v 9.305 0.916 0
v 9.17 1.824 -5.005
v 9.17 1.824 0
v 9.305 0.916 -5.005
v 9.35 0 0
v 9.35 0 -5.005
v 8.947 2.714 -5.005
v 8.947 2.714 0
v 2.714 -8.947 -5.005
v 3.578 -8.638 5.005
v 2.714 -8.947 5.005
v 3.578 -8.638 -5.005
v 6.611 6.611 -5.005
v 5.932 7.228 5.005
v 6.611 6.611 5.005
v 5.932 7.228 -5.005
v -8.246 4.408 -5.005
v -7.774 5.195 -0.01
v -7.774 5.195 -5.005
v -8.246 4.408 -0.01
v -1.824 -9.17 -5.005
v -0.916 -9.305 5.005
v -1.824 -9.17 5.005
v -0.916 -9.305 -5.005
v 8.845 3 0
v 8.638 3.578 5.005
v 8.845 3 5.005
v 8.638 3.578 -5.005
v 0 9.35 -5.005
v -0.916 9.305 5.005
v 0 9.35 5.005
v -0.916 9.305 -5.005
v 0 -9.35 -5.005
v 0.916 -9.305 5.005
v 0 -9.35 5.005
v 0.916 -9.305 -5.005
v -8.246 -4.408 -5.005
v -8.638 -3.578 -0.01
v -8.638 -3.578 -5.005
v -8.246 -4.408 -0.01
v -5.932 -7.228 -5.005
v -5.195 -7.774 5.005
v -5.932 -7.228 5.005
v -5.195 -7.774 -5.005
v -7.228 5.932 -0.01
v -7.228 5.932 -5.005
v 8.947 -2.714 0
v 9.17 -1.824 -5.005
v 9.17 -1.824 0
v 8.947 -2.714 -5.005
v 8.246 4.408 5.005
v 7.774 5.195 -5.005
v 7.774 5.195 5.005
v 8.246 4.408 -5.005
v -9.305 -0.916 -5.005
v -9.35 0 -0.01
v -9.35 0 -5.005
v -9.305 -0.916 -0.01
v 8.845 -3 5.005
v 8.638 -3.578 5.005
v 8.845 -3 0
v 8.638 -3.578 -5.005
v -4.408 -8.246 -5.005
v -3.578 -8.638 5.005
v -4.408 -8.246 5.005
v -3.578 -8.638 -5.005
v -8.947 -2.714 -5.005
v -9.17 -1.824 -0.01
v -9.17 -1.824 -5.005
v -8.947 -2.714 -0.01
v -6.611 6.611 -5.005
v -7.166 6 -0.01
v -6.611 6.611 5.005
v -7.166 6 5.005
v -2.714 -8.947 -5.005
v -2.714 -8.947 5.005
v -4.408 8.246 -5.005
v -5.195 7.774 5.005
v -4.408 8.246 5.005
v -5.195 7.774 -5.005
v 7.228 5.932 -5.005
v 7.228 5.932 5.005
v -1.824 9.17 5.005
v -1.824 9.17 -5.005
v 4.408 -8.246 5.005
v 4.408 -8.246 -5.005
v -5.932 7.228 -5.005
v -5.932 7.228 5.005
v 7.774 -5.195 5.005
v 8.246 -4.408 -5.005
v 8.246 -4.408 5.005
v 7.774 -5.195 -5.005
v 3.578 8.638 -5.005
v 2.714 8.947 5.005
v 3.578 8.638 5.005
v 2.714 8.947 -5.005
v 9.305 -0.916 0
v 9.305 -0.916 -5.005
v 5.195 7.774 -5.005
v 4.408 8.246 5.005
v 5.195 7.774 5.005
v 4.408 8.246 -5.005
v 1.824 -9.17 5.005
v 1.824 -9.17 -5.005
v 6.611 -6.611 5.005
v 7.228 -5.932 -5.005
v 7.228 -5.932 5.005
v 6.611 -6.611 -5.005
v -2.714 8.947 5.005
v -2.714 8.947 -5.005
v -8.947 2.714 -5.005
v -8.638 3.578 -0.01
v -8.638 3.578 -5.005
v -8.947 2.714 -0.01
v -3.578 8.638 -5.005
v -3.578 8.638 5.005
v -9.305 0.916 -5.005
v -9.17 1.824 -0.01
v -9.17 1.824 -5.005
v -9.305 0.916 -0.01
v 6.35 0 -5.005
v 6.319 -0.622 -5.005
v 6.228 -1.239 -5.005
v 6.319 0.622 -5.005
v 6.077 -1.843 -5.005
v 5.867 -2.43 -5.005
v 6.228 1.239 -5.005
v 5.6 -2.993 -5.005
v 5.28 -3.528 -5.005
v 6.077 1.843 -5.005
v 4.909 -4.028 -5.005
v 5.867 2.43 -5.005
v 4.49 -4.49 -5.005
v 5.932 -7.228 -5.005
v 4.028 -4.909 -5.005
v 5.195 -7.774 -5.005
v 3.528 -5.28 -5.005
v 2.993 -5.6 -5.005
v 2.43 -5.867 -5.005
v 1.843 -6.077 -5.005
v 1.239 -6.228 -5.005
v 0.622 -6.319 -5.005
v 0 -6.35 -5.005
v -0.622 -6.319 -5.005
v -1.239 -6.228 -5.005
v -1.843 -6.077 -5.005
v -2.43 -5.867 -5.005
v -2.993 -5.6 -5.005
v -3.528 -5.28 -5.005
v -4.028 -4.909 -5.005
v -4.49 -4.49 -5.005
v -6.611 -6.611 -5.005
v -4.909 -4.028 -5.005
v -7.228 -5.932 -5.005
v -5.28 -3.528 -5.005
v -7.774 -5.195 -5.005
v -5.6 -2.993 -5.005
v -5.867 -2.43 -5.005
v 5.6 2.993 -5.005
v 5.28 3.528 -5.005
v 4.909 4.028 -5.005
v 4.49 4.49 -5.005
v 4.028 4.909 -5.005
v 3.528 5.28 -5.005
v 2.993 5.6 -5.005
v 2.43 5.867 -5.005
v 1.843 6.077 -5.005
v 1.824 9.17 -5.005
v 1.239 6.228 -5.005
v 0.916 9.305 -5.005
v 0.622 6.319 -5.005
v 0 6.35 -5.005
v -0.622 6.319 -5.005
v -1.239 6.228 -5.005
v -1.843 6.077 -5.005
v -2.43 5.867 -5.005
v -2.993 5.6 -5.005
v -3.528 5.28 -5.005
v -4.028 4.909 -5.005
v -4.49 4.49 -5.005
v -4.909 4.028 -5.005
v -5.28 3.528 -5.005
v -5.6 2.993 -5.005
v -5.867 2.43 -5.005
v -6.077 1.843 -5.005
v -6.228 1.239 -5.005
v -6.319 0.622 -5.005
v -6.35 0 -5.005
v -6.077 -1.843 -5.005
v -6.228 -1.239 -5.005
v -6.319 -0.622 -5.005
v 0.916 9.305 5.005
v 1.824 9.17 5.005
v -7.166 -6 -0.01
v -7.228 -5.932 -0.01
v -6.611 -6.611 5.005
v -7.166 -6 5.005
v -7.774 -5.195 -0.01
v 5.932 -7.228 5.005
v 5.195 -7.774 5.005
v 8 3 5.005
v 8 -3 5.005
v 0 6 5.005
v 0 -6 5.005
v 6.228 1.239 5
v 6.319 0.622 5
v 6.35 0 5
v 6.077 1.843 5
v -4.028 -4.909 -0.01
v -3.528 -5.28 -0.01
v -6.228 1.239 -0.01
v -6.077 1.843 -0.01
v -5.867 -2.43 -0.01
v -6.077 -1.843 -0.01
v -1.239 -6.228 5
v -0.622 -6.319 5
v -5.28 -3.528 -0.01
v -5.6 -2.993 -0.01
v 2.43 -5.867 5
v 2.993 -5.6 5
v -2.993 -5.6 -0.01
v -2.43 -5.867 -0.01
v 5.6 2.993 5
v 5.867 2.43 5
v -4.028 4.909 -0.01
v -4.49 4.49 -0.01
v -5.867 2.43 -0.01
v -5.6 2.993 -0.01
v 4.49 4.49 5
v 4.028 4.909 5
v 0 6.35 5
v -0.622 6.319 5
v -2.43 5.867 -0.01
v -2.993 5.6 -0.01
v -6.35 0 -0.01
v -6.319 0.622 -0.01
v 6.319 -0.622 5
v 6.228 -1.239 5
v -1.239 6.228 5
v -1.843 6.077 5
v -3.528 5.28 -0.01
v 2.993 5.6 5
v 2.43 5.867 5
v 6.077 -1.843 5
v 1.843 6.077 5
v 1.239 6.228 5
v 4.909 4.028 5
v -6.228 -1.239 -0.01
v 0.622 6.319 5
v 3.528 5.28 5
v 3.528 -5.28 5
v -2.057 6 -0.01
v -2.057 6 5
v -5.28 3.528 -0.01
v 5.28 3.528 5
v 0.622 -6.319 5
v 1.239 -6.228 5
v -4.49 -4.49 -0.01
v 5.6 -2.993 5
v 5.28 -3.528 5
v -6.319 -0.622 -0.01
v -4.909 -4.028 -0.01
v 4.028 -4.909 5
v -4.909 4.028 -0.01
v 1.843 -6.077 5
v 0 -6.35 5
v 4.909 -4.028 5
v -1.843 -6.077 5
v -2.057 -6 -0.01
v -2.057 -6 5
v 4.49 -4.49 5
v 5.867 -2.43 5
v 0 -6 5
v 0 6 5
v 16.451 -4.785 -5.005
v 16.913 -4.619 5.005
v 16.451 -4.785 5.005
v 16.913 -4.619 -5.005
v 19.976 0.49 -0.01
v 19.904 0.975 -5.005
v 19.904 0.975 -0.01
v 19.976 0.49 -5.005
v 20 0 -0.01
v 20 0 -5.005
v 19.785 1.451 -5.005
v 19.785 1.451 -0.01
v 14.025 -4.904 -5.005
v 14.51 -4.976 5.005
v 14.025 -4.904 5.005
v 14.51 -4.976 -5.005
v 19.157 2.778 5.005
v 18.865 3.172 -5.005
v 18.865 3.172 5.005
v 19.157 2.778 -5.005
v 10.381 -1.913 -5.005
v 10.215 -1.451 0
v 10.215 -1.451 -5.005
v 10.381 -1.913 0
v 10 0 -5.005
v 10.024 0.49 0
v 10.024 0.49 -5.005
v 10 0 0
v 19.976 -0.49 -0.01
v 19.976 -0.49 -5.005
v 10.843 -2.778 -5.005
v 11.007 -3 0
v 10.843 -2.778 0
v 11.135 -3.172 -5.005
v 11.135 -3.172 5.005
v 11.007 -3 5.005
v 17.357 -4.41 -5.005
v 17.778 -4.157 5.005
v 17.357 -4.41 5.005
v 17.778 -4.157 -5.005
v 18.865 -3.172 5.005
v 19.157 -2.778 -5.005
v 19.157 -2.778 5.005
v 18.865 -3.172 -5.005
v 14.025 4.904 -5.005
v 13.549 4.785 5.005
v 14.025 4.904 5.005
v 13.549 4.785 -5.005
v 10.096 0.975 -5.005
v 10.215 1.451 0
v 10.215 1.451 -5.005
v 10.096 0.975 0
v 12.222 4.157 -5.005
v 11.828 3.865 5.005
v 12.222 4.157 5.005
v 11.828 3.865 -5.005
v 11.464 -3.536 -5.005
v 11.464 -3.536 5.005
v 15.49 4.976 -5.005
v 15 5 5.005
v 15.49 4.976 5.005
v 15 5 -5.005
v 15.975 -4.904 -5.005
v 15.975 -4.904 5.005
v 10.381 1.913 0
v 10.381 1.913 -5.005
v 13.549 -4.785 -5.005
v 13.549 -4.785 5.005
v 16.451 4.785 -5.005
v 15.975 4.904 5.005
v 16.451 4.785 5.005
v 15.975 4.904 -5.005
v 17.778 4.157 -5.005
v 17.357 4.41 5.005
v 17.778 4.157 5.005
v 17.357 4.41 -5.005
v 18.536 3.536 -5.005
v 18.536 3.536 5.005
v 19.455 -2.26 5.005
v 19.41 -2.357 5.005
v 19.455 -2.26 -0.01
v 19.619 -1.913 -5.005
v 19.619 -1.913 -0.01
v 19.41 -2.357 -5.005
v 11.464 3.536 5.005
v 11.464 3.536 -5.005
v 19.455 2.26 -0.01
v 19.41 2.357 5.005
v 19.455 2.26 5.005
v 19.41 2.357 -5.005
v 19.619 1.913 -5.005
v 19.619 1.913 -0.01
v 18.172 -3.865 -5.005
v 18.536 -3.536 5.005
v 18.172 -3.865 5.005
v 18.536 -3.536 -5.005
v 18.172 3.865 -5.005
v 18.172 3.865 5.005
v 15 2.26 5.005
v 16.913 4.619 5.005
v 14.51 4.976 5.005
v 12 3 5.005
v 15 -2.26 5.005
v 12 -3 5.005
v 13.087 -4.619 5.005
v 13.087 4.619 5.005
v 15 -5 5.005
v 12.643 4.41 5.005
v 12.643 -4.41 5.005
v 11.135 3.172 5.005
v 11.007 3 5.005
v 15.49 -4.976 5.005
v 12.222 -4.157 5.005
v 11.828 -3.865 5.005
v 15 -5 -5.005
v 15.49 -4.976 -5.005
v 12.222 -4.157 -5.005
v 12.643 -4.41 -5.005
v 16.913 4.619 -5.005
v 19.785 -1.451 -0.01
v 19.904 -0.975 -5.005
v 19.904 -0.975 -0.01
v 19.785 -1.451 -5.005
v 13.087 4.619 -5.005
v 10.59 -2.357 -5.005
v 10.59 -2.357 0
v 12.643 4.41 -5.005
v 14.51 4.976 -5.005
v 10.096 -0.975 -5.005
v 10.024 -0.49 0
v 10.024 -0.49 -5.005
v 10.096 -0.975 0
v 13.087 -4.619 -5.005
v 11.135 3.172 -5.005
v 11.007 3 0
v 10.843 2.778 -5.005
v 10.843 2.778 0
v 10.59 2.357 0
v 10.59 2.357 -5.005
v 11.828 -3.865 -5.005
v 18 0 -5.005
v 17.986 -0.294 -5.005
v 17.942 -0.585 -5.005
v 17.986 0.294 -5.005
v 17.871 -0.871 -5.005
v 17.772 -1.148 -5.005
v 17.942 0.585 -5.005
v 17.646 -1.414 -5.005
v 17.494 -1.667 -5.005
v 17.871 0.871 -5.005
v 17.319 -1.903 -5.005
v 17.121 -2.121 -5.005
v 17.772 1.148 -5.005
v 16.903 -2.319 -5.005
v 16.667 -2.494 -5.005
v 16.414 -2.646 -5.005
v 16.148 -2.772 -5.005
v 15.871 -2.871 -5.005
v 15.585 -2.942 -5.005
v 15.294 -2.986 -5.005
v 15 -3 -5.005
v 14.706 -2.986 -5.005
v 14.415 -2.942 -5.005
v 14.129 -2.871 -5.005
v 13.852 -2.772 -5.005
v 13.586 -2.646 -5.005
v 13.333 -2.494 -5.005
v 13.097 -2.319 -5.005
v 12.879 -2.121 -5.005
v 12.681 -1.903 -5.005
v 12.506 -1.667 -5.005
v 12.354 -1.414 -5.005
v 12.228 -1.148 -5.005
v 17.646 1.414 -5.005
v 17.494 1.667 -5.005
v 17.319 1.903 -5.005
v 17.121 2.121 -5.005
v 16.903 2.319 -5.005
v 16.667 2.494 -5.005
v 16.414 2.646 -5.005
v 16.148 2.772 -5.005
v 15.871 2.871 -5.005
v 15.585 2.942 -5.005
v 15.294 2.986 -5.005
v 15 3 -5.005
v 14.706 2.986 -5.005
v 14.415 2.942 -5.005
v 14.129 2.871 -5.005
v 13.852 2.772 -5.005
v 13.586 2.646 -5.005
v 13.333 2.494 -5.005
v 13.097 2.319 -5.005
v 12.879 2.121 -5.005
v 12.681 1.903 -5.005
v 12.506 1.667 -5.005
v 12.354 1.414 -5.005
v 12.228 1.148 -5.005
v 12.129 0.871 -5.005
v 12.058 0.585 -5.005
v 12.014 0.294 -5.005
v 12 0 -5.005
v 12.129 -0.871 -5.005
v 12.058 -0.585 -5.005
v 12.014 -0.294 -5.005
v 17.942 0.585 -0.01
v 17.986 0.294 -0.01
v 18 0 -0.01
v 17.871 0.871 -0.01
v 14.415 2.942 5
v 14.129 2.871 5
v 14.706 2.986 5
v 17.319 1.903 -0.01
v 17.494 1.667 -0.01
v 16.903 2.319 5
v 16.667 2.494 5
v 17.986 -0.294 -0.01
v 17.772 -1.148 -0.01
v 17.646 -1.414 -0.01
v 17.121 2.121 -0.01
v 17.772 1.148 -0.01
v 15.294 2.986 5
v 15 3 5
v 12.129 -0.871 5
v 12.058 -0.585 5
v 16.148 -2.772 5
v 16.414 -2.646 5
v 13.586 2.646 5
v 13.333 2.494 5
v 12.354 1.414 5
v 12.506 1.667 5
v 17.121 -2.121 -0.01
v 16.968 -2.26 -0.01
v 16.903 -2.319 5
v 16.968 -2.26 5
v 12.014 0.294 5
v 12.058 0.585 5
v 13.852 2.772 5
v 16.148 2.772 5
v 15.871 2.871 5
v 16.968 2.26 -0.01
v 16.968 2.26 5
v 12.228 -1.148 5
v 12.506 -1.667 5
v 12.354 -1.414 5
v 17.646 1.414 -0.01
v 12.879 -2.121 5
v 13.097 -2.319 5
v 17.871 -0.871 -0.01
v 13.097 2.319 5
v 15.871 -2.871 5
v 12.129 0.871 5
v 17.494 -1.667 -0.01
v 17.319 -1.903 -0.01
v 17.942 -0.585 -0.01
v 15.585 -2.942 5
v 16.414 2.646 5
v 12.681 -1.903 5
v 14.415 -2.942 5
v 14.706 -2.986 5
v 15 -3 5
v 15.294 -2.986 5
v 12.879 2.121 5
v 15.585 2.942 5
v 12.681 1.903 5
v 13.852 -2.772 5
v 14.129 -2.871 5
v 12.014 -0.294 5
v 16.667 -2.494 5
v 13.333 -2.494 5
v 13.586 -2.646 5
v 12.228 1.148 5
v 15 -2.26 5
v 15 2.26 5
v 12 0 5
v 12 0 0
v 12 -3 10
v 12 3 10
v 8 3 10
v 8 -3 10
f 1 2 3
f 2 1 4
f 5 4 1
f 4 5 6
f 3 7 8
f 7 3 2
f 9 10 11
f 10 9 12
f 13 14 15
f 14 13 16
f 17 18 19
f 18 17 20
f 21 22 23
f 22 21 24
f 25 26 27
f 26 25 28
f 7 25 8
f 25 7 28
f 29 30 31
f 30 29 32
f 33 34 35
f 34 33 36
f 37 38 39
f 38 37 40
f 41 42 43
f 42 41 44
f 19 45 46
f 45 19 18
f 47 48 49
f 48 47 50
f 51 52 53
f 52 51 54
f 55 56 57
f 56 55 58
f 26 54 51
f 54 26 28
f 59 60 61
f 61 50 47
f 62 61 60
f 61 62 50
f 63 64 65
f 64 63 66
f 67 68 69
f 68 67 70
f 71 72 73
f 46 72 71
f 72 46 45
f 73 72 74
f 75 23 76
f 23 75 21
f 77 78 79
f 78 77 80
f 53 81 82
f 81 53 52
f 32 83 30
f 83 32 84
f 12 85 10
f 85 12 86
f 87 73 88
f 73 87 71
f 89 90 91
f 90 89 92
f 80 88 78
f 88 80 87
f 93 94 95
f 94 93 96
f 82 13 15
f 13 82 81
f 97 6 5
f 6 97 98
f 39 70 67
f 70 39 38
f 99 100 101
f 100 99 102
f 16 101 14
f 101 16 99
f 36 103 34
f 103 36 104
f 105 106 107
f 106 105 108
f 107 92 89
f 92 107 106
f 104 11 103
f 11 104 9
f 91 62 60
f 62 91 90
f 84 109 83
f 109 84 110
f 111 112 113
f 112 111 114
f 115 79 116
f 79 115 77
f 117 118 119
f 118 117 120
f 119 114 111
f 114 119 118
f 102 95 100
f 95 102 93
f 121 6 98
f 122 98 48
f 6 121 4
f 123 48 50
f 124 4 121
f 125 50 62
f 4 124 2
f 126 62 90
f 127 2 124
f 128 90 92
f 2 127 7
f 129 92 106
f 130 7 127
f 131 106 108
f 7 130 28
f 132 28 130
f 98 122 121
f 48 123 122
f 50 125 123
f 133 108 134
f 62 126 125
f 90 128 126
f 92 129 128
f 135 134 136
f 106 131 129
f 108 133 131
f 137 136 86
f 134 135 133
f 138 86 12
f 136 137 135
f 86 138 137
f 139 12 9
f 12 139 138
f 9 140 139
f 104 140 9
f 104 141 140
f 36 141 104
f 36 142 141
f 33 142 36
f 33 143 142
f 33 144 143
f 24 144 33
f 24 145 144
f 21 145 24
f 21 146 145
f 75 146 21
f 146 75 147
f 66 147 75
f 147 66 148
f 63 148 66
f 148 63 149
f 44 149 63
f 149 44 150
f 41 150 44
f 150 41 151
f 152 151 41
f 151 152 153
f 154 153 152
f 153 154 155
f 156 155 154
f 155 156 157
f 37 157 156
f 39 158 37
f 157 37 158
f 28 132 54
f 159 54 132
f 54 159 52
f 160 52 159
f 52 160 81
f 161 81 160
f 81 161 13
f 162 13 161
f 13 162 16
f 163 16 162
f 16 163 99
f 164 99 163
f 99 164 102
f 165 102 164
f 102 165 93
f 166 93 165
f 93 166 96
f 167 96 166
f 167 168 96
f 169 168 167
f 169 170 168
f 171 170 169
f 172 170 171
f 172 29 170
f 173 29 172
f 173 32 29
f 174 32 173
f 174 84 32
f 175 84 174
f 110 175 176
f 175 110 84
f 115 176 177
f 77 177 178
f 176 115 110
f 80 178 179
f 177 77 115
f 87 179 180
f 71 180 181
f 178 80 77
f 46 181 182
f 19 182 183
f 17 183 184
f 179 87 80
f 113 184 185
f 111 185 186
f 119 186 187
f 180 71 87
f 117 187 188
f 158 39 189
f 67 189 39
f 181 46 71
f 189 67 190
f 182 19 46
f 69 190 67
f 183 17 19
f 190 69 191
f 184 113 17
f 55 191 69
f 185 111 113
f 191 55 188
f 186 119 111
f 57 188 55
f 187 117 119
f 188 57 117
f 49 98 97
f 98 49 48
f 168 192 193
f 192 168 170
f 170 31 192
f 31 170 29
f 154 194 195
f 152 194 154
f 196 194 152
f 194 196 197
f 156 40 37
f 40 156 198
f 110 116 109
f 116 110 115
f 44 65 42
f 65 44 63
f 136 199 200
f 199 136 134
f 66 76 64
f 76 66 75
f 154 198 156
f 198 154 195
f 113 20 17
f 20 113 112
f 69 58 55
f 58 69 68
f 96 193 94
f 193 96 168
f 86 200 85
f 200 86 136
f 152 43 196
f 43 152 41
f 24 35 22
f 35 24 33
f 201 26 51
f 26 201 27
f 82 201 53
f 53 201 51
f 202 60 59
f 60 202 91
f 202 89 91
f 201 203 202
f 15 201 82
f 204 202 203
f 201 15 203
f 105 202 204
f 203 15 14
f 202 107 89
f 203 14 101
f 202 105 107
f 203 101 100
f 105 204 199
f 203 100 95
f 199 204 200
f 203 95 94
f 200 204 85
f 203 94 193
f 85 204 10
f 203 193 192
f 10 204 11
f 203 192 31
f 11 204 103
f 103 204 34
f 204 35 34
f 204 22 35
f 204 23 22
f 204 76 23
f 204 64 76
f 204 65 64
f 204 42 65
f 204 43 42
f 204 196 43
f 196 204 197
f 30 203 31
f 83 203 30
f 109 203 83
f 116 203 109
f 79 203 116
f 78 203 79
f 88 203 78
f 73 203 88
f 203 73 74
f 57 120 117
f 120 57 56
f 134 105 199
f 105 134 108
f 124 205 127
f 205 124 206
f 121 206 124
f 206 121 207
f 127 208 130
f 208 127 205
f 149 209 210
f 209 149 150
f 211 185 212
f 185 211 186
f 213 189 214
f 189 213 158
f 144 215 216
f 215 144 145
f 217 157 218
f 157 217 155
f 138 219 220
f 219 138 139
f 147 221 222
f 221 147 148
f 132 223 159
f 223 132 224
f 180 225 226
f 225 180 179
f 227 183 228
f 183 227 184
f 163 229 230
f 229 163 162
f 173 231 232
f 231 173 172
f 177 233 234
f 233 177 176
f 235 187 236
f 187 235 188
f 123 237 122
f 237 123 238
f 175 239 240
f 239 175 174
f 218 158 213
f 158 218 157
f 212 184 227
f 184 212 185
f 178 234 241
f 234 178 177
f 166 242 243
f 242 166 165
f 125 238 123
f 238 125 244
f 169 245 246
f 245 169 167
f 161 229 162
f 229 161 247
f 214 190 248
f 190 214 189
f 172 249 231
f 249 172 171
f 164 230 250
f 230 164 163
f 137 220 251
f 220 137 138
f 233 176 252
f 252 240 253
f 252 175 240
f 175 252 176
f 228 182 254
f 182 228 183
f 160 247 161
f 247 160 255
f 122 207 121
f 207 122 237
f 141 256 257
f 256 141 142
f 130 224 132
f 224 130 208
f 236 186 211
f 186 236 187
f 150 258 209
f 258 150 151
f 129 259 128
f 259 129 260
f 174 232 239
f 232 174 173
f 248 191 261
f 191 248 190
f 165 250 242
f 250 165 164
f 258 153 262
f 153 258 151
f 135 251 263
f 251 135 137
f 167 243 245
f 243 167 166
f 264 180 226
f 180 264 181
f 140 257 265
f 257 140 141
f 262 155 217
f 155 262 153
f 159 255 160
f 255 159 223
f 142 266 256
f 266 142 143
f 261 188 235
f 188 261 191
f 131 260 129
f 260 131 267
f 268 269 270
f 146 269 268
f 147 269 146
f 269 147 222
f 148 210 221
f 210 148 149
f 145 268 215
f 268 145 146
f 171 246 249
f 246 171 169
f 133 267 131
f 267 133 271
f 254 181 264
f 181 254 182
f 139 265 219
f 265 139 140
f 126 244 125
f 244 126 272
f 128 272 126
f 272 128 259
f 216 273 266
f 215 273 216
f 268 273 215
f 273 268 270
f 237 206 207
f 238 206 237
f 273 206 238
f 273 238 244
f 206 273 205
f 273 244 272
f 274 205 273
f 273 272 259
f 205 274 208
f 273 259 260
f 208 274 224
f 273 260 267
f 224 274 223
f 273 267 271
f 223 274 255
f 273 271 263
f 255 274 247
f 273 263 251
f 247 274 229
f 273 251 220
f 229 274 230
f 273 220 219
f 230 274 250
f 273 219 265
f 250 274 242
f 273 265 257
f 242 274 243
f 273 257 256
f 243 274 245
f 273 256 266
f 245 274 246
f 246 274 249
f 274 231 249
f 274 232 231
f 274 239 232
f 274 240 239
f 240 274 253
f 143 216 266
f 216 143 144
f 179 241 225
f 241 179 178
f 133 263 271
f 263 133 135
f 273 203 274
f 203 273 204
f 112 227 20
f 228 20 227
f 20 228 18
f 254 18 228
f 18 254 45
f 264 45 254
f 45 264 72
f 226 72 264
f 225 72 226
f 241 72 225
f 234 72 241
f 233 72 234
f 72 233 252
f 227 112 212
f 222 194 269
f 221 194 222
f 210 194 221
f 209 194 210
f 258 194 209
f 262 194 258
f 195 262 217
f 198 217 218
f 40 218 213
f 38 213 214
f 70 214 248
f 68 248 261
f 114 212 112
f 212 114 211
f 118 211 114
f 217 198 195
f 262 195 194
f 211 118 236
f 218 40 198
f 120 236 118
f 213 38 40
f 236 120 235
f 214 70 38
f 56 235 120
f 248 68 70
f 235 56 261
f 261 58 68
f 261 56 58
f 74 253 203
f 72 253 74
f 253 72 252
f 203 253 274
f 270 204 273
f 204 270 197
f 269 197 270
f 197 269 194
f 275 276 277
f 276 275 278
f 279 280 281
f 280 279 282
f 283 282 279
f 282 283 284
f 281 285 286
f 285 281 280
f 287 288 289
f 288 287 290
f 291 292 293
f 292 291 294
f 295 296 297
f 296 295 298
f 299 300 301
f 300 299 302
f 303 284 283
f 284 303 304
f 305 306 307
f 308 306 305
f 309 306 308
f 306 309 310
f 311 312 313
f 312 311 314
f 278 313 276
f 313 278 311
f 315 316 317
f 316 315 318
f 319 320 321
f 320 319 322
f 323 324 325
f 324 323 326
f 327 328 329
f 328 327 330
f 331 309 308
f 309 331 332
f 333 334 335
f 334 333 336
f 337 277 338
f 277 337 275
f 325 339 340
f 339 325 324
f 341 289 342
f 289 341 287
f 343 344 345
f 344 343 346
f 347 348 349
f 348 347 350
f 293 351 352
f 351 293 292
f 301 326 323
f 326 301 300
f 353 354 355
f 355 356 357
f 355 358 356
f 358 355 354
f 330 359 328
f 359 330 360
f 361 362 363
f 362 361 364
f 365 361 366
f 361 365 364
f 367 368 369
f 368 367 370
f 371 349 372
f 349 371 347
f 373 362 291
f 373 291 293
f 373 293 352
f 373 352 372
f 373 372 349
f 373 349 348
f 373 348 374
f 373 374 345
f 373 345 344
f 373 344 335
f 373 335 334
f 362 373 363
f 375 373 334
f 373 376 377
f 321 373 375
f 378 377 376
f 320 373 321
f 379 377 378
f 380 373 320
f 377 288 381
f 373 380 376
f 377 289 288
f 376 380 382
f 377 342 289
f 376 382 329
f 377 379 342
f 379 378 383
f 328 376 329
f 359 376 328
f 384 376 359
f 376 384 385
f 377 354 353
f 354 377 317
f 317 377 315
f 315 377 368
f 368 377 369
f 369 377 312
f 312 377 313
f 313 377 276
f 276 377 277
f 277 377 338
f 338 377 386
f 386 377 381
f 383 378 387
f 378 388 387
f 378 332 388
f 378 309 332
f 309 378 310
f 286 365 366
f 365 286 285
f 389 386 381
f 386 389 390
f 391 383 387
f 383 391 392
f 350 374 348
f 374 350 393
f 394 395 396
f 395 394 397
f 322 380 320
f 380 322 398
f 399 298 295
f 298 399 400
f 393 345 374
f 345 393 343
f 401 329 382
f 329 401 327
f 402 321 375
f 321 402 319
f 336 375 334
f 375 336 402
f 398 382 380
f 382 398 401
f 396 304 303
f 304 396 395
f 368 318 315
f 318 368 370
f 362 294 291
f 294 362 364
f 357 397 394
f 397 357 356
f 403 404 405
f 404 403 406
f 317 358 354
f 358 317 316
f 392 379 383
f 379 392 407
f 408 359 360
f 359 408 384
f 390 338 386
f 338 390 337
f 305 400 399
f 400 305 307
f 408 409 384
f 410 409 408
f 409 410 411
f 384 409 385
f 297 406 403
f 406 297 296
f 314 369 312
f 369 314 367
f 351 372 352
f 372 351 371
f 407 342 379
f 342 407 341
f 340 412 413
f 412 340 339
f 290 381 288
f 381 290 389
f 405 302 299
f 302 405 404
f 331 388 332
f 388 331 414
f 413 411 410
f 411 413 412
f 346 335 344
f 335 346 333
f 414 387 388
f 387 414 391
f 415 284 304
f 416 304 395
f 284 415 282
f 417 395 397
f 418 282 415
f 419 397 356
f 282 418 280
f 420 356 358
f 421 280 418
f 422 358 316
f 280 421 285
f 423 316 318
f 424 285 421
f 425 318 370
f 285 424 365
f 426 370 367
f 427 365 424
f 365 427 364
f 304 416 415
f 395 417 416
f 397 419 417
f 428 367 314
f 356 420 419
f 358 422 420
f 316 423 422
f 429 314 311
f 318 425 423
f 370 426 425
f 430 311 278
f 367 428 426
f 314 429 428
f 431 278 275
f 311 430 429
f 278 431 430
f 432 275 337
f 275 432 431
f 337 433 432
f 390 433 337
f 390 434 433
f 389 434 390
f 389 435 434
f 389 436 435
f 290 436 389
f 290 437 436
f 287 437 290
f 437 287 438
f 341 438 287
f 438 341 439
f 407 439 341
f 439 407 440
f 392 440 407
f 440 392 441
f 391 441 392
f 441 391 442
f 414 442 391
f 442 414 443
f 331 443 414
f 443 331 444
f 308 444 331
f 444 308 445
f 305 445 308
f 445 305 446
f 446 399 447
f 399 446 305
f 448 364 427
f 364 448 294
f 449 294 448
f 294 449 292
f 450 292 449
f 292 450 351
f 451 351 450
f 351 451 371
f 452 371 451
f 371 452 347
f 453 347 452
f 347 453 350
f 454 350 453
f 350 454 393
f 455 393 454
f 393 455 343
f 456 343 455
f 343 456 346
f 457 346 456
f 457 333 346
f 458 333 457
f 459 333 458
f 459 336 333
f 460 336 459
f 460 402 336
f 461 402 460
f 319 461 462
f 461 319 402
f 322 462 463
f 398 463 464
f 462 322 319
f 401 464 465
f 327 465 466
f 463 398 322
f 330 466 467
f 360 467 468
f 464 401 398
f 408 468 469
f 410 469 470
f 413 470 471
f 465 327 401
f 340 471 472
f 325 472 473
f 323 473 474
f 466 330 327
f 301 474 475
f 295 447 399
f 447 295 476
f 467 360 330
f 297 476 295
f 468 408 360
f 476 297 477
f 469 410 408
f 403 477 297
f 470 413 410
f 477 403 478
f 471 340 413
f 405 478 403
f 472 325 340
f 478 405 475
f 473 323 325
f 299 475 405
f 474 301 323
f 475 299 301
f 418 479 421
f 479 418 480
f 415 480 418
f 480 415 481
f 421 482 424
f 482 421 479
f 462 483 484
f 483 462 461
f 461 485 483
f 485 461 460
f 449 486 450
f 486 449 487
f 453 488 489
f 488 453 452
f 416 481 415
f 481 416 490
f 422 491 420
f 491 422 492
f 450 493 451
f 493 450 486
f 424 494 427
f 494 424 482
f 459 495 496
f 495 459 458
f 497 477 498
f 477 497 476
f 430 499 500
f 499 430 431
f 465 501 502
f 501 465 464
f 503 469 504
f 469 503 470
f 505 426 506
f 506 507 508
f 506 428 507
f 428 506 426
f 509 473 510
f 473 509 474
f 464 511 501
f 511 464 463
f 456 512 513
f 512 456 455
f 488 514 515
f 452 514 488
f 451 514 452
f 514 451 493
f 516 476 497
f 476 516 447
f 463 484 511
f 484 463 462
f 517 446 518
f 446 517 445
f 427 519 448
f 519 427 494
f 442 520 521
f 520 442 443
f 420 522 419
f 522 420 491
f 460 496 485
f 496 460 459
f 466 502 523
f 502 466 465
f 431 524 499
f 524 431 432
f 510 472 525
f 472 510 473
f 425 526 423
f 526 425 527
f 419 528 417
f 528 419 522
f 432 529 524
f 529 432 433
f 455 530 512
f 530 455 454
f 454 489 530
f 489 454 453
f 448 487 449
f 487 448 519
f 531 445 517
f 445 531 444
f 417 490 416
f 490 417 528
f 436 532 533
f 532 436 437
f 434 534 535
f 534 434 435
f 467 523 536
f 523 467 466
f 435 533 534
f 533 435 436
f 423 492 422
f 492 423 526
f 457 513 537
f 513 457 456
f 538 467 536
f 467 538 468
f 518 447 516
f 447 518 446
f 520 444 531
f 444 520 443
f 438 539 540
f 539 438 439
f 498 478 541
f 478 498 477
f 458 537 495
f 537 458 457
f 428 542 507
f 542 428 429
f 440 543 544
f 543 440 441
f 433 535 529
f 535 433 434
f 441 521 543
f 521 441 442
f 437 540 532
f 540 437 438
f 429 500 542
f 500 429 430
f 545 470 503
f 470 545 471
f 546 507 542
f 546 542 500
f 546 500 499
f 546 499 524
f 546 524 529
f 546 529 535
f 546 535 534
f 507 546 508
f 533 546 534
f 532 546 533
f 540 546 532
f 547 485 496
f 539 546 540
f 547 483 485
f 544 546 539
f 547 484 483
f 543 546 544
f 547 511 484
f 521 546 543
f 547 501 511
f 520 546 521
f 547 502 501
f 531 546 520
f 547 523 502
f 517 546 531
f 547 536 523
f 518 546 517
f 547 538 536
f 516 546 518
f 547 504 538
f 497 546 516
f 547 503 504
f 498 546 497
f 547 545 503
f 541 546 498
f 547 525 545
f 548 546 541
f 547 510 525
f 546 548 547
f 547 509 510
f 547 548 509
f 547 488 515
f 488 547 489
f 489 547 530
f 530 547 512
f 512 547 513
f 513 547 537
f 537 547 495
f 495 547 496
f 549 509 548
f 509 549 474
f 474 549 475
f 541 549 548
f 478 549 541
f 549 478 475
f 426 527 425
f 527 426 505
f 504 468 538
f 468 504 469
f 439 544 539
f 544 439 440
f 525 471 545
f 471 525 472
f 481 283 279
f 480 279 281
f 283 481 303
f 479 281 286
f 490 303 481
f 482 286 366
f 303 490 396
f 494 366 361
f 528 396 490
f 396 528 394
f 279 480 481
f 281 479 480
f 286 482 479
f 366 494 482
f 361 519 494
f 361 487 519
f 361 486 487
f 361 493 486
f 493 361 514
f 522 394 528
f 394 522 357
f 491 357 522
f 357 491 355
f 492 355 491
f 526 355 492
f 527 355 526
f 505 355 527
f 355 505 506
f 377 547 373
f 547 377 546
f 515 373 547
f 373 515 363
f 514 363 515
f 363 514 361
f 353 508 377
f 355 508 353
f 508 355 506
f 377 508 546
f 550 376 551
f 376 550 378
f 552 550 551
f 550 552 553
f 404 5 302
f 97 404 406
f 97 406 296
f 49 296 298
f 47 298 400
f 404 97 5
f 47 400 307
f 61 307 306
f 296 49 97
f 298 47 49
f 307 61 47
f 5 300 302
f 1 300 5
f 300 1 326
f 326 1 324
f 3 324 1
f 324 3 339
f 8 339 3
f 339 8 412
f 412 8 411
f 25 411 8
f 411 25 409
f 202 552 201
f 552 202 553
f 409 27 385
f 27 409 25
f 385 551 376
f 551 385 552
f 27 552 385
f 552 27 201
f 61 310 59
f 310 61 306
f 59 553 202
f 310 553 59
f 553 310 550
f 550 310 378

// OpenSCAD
$fn = 64;

// Dimensions
rod_id = 12.7;        // inner diameter of rod ring (mm)
rod_wall = 3;         // wall thickness of rod ring (mm)
rod_od = rod_id + 2 * rod_wall;  // outer diameter of rod ring (mm)
rod_ring_height = 10; // height of the entire clip (Z)

tubing_id = 6;        // inner diameter of tubing ring (mm)
tubing_wall = 2;      // wall thickness of tubing ring (mm)
tubing_od = tubing_id + 2 * tubing_wall;  // outer diameter of tubing ring (mm)

bridge_width = 6;     // width of bridge in Y-direction (mm)
bridge_x_start = 8;   // start x-coordinate of bridge
bridge_x_end = 12;    // end x-coordinate of bridge

// Opening dimensions
rod_opening_width = 10;   // width of rod ring opening (mm)
tubing_opening_width = 4.5; // width of tubing ring opening (mm)

// Calculate centers
rod_center_x = 0;
rod_center_y = 0;
tubing_center_x = 15;
tubing_center_y = 0;

// Rod ring with opening
module rod_ring_with_opening() {
    difference() {
        // Outer circle
        cylinder(h = rod_ring_height + 0.01, d = rod_od, center = true);
        // Inner circle (hole)
        translate([0, 0, -0.01])
            cylinder(h = rod_ring_height + 0.02, d = rod_id, center = true);
        // Opening cut: remove x < 0 and -5 < y < 5
        translate([-100, -6, -0.01])
            cube([100, 12, rod_ring_height + 0.02]);
    }
}

// Tubing ring with opening
module tubing_ring_with_opening() {
    difference() {
        // Outer circle
        translate([tubing_center_x, tubing_center_y, 0])
            cylinder(h = rod_ring_height + 0.01, d = tubing_od, center = true);
        // Inner circle (hole)
        translate([tubing_center_x, tubing_center_y, -0.01])
            cylinder(h = rod_ring_height + 0.02, d = tubing_id, center = true);
        // Opening cut: remove x > 15 and -2.25 < y < 2.25
        translate([15, -2.25 - 0.01, -0.01])
            cube([100, 4.5 + 0.02, rod_ring_height + 0.02]);
    }
}

// Bridge between rings
module bridge() {
    // y-range: from -3 to +3 (6 mm wide)
    y_start = -bridge_width / 2;
    y_end = bridge_width / 2;
    
    translate([bridge_x_start, y_start, 0])
        cube([bridge_x_end - bridge_x_start, bridge_width, rod_ring_height]);
}

// Assemble the clip
module clip() {
    union() {
        rod_ring_with_opening();
        tubing_ring_with_opening();
        bridge();
    }
}

clip();
